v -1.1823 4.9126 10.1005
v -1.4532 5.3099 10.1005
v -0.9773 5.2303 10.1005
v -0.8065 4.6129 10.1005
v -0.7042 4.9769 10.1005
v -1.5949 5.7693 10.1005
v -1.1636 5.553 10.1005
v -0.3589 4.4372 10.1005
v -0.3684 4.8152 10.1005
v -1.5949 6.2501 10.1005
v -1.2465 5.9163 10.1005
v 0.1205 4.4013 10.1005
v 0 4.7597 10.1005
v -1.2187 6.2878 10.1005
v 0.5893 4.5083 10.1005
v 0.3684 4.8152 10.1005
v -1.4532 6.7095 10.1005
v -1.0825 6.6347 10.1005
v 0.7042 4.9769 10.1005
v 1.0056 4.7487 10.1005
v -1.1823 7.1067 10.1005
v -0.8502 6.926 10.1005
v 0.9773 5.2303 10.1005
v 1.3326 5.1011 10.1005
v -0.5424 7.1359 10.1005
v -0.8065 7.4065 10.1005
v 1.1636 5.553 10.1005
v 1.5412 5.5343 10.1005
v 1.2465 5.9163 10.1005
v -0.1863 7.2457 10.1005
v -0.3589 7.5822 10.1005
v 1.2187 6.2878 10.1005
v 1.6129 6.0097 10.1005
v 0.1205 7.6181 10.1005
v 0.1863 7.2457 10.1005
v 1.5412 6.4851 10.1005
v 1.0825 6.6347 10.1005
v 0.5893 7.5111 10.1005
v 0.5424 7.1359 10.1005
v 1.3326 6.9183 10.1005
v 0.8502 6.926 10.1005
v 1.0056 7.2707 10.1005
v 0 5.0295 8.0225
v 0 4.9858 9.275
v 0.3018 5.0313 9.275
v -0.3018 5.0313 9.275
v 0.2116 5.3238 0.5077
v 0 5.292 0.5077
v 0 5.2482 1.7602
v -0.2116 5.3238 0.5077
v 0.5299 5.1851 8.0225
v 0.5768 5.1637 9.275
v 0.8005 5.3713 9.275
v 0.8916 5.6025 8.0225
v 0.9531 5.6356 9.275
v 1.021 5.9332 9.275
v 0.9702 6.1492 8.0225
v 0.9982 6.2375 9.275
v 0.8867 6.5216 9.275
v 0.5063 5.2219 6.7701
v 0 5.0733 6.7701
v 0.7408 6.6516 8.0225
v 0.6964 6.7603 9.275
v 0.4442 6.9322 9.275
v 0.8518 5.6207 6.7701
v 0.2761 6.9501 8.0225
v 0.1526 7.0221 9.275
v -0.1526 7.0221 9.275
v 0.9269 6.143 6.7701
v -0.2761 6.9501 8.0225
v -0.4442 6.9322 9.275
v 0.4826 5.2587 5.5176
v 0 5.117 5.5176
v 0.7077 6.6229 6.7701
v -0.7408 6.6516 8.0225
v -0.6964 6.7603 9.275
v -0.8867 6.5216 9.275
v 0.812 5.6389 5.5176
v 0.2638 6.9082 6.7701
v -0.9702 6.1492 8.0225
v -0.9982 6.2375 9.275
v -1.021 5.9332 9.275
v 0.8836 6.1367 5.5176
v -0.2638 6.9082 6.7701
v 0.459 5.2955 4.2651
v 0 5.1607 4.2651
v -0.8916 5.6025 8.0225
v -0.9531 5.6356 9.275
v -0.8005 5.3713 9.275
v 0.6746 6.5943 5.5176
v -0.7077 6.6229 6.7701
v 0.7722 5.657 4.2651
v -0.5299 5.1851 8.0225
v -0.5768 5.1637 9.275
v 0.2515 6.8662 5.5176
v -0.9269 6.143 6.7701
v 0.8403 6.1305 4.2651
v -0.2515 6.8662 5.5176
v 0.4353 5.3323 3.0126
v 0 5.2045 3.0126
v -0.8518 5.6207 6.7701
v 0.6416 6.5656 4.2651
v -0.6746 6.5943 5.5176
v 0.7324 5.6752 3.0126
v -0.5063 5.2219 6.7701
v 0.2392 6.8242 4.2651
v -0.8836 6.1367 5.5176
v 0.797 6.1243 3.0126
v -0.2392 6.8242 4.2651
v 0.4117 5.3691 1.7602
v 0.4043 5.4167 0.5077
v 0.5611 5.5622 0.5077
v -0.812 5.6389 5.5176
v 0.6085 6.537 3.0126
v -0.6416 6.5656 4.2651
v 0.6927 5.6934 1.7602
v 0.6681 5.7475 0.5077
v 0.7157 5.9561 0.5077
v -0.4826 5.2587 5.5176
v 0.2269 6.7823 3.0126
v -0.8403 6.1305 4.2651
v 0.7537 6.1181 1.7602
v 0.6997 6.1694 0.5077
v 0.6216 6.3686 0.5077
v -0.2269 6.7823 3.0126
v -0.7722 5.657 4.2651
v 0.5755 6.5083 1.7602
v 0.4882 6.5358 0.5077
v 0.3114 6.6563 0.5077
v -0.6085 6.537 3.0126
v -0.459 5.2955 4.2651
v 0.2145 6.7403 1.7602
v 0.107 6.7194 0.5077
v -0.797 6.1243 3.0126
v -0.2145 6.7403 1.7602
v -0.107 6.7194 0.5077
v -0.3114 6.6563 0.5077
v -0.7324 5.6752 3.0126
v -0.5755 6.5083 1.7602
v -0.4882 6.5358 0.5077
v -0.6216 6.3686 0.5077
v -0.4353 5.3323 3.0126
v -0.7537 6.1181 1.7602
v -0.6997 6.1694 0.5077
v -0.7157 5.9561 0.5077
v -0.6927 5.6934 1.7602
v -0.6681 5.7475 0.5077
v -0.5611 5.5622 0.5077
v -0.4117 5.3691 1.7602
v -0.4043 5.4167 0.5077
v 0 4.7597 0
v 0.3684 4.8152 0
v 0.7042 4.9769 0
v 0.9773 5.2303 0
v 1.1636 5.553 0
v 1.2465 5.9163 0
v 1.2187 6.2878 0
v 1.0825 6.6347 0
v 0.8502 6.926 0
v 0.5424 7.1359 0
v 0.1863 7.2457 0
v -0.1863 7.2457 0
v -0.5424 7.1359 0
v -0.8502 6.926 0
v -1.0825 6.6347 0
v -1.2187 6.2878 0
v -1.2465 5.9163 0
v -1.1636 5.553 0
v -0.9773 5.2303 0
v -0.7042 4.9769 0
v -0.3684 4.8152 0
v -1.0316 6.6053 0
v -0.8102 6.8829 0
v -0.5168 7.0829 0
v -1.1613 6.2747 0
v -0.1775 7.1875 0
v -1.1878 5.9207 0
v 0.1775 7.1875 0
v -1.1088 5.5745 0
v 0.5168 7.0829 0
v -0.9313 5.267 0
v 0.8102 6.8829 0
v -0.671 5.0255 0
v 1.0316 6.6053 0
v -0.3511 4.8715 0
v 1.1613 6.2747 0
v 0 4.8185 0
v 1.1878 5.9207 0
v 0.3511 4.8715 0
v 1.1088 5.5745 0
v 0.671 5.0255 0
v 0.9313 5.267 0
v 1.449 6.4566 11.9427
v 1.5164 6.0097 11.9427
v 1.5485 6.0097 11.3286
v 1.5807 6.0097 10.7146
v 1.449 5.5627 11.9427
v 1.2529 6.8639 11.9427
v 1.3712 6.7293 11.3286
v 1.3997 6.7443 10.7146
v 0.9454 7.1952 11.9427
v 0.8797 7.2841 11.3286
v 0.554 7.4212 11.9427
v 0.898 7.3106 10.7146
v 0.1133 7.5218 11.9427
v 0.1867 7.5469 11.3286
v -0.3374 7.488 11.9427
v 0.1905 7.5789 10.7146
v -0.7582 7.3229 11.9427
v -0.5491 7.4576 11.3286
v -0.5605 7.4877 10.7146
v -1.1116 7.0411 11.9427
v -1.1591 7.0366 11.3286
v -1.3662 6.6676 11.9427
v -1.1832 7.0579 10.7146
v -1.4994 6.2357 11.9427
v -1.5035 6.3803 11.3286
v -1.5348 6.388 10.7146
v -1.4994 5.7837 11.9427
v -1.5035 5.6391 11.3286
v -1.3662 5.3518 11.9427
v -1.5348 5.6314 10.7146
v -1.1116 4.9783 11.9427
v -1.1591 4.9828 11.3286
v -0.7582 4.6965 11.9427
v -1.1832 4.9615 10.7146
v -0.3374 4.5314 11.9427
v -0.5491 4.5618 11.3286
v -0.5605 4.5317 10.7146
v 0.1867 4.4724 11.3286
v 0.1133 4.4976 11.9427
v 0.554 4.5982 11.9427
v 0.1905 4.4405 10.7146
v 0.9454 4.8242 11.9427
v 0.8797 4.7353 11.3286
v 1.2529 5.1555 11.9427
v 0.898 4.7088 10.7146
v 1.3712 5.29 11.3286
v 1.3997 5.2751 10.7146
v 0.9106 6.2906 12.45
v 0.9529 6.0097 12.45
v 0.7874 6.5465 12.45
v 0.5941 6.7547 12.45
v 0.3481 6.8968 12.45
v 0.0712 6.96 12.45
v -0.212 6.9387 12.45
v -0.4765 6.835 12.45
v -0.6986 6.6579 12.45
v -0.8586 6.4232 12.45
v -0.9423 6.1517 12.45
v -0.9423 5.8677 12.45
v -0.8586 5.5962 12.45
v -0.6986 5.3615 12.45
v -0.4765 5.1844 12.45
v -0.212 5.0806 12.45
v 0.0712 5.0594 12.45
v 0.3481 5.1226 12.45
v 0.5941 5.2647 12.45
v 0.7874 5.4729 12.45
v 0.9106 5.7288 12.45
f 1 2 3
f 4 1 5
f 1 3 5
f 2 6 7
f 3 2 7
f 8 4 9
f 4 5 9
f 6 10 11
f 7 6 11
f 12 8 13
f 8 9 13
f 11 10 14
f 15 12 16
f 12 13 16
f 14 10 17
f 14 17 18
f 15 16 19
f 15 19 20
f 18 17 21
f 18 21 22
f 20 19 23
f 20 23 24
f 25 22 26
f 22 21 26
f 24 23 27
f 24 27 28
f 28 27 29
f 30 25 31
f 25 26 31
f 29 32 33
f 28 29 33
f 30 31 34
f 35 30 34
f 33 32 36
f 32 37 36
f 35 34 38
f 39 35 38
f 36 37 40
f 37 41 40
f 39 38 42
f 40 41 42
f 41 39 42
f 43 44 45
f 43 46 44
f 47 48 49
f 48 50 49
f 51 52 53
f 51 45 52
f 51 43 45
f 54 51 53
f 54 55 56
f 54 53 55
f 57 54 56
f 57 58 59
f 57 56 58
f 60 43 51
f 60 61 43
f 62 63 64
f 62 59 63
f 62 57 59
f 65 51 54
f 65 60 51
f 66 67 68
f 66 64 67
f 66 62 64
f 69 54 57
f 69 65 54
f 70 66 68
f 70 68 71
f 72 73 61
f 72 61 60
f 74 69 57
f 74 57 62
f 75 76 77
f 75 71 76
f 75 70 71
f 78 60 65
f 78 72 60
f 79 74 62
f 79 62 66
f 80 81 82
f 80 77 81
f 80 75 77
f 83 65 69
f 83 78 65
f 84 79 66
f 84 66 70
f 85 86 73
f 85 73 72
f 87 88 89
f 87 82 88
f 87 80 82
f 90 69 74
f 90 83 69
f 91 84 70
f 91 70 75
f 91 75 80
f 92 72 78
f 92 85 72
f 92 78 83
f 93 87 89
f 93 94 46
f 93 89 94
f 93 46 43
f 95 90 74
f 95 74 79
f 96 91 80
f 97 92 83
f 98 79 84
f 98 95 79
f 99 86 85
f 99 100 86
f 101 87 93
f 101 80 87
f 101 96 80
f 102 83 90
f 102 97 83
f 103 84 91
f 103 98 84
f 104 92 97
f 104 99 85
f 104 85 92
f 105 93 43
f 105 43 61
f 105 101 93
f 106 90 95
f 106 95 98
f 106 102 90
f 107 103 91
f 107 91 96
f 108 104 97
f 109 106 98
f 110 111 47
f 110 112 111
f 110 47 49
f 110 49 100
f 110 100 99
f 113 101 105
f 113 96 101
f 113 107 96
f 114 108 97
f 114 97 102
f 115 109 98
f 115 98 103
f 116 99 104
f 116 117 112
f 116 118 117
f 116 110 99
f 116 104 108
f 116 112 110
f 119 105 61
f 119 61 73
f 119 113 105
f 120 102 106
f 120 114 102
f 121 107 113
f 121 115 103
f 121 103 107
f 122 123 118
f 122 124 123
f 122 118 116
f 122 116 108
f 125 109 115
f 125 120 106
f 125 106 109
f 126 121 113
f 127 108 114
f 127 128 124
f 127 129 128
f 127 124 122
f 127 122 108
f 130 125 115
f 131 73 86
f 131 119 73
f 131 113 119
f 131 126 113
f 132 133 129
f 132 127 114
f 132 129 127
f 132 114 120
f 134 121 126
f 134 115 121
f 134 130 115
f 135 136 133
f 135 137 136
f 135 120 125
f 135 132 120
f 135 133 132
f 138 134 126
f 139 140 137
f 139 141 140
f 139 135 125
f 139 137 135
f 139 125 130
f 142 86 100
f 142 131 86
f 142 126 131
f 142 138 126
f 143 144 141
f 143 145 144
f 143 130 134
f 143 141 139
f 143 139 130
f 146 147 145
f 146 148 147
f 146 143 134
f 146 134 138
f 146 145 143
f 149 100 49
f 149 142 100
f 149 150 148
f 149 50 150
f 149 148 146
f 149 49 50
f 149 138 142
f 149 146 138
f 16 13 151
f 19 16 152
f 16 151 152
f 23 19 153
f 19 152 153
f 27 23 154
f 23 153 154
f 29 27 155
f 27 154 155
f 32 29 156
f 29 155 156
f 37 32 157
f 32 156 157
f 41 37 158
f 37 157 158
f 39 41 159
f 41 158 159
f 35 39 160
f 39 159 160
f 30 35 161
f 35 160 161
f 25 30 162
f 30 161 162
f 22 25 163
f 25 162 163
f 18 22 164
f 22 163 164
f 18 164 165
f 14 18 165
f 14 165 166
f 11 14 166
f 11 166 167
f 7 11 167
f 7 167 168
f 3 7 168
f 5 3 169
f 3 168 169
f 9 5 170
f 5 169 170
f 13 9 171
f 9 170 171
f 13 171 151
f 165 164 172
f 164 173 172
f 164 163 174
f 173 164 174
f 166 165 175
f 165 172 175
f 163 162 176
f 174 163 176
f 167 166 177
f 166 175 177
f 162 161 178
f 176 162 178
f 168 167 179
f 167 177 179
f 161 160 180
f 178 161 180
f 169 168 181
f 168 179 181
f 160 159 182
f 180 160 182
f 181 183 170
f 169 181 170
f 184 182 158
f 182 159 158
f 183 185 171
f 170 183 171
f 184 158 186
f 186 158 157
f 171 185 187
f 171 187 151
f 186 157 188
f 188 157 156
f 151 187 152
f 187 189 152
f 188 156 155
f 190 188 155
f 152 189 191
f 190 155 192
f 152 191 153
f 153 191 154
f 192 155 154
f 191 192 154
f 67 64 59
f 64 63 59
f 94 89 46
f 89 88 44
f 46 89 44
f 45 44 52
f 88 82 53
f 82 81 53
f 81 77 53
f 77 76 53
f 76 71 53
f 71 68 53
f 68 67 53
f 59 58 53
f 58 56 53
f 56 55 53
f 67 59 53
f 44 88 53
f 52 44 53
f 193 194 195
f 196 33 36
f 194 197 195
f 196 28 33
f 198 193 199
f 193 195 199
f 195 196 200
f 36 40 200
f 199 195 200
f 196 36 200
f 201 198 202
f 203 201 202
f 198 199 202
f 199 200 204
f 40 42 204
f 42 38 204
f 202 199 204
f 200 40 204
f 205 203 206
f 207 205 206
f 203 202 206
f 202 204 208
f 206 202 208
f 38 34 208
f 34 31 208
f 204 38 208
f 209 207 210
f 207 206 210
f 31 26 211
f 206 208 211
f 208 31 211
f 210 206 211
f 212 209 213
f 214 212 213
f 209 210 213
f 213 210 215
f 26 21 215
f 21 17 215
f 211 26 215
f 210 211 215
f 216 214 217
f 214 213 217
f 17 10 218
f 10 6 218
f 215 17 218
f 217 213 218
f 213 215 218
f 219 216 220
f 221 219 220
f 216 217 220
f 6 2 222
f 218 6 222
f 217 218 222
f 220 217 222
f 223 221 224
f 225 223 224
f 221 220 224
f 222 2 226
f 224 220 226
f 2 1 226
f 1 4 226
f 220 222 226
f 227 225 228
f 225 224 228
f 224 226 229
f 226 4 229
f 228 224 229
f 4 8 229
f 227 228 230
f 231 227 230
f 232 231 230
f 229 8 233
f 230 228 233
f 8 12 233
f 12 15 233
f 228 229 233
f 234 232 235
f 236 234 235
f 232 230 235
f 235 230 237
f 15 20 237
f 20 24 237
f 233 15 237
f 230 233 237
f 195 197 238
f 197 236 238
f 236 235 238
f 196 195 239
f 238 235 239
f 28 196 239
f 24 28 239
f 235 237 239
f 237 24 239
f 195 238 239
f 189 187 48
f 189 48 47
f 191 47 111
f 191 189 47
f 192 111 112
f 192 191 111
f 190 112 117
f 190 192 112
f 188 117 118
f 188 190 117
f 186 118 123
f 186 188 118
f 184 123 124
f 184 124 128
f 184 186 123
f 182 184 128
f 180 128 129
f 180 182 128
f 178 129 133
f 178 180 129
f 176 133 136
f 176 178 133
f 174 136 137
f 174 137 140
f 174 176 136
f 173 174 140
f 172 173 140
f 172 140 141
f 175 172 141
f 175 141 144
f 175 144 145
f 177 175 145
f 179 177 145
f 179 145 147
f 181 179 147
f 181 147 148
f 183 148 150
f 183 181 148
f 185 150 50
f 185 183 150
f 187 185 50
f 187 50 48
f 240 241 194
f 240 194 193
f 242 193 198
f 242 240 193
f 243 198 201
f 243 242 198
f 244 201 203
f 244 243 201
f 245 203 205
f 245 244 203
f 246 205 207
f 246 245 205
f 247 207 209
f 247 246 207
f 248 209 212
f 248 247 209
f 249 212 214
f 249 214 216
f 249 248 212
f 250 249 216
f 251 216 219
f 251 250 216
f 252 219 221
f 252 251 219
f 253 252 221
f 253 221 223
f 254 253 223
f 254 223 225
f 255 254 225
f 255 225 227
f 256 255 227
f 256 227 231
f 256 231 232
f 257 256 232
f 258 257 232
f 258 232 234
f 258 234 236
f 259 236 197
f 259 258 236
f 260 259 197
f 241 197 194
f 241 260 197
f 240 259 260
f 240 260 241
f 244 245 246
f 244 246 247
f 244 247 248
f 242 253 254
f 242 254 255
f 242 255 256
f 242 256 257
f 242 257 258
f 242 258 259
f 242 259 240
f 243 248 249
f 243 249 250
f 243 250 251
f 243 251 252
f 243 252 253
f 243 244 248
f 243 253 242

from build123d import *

# Parameters (mm, degrees)
SKETCH1_R           = 1.25
SKETCH1_R_2         = 0.7
BOSS_EXTRUDE1_DEPTH = 12.45
DRAFT1_ANGLE        = -2
BOSS_EXTRUDE2_START = -3.175
SKETCH2_R           = 1.25
BOSS_EXTRUDE2_DEPTH = 3.175
BOSS_EXTRUDE3_START = -2.3495
SKETCH3_R           = 1.6129
SKETCH3_R_2         = 1.25
BOSS_EXTRUDE3_DEPTH = 2.3495
DRAFT2_ANGLE        = -3
CHAMFER1_SIZE       = 0.508
CHAMFER1_SIZE2      = 0.491158032
CHAMFER2_SIZE       = 0.508
CHAMFER2_SIZE2      = 0.536831287


with BuildPart() as part:
    # Sketch1 → Boss-Extrude1 (new body)
    with BuildSketch(Plane.XY):
        with Locations(Location((0, 6.009690382, 0), (0, 0, 270))):
            Circle(SKETCH1_R)
        with Locations(Location((0, 6.009690382, 0), (0, 0, 270))):
            Circle(SKETCH1_R_2, mode=Mode.SUBTRACT)
    extrude(amount=BOSS_EXTRUDE1_DEPTH)

    # Draft1
    draft1_faces = [part.faces().sort_by_distance(p)[0] for p in [
        (0, 6.709690382, 6.225),
    ]]
    draft(draft1_faces, Plane(origin=(0, 6.009690382, 0), x_dir=(-1, 0, 0), z_dir=(0, 0, -1)), DRAFT1_ANGLE)

    # Sketch2 → Boss-Extrude2 (add)
    with BuildSketch(Plane.XY.offset(12.45).offset(BOSS_EXTRUDE2_START)):
        with Locations(Location((0, 6.009690382, 0), (0, 0, 270))):
            Circle(SKETCH2_R)
    extrude(amount=BOSS_EXTRUDE2_DEPTH)

    # Sketch3 → Boss-Extrude3 (add)
    with BuildSketch(Plane.XY.offset(12.45).offset(BOSS_EXTRUDE3_START)):
        with Locations((0, 6.009690382)):
            Circle(SKETCH3_R)
        with Locations((0, 6.009690382)):
            Circle(SKETCH3_R_2, mode=Mode.SUBTRACT)
    extrude(amount=BOSS_EXTRUDE3_DEPTH)

    # Draft2
    draft2_faces = [part.faces().sort_by_distance(p)[0] for p in [
        (-1.6129, 6.009690382, 11.27525),
    ]]
    draft(draft2_faces, Plane(origin=(0, 6.009690382, 10.1005), x_dir=(-1, 0, 0), z_dir=(0, 0, -1)), DRAFT2_ANGLE)

    # Chamfer1
    chamfer1_edges = [part.edges().sort_by_distance(p)[0] for p in [
        (0, 6.709690382, 0),
    ]]
    chamfer1_side = [part.faces().sort_by_distance(p)[0] for p in [
        (0, 6.871635451, 4.6375),
    ]]
    chamfer(chamfer1_edges, length=CHAMFER1_SIZE, length2=CHAMFER1_SIZE2, reference=chamfer1_side[0])

    # Chamfer2
    chamfer2_edges = [part.edges().sort_by_distance(p)[0] for p in [
        (-1.489767923, 6.009690382, 12.45),
    ]]
    chamfer2_side = [part.faces().sort_by_distance(p)[0] for p in [
        (-1.551333961, 6.009690382, 11.27525),
    ]]
    chamfer(chamfer2_edges, length=CHAMFER2_SIZE, length2=CHAMFER2_SIZE2, reference=chamfer2_side[0])


solid = part.part
